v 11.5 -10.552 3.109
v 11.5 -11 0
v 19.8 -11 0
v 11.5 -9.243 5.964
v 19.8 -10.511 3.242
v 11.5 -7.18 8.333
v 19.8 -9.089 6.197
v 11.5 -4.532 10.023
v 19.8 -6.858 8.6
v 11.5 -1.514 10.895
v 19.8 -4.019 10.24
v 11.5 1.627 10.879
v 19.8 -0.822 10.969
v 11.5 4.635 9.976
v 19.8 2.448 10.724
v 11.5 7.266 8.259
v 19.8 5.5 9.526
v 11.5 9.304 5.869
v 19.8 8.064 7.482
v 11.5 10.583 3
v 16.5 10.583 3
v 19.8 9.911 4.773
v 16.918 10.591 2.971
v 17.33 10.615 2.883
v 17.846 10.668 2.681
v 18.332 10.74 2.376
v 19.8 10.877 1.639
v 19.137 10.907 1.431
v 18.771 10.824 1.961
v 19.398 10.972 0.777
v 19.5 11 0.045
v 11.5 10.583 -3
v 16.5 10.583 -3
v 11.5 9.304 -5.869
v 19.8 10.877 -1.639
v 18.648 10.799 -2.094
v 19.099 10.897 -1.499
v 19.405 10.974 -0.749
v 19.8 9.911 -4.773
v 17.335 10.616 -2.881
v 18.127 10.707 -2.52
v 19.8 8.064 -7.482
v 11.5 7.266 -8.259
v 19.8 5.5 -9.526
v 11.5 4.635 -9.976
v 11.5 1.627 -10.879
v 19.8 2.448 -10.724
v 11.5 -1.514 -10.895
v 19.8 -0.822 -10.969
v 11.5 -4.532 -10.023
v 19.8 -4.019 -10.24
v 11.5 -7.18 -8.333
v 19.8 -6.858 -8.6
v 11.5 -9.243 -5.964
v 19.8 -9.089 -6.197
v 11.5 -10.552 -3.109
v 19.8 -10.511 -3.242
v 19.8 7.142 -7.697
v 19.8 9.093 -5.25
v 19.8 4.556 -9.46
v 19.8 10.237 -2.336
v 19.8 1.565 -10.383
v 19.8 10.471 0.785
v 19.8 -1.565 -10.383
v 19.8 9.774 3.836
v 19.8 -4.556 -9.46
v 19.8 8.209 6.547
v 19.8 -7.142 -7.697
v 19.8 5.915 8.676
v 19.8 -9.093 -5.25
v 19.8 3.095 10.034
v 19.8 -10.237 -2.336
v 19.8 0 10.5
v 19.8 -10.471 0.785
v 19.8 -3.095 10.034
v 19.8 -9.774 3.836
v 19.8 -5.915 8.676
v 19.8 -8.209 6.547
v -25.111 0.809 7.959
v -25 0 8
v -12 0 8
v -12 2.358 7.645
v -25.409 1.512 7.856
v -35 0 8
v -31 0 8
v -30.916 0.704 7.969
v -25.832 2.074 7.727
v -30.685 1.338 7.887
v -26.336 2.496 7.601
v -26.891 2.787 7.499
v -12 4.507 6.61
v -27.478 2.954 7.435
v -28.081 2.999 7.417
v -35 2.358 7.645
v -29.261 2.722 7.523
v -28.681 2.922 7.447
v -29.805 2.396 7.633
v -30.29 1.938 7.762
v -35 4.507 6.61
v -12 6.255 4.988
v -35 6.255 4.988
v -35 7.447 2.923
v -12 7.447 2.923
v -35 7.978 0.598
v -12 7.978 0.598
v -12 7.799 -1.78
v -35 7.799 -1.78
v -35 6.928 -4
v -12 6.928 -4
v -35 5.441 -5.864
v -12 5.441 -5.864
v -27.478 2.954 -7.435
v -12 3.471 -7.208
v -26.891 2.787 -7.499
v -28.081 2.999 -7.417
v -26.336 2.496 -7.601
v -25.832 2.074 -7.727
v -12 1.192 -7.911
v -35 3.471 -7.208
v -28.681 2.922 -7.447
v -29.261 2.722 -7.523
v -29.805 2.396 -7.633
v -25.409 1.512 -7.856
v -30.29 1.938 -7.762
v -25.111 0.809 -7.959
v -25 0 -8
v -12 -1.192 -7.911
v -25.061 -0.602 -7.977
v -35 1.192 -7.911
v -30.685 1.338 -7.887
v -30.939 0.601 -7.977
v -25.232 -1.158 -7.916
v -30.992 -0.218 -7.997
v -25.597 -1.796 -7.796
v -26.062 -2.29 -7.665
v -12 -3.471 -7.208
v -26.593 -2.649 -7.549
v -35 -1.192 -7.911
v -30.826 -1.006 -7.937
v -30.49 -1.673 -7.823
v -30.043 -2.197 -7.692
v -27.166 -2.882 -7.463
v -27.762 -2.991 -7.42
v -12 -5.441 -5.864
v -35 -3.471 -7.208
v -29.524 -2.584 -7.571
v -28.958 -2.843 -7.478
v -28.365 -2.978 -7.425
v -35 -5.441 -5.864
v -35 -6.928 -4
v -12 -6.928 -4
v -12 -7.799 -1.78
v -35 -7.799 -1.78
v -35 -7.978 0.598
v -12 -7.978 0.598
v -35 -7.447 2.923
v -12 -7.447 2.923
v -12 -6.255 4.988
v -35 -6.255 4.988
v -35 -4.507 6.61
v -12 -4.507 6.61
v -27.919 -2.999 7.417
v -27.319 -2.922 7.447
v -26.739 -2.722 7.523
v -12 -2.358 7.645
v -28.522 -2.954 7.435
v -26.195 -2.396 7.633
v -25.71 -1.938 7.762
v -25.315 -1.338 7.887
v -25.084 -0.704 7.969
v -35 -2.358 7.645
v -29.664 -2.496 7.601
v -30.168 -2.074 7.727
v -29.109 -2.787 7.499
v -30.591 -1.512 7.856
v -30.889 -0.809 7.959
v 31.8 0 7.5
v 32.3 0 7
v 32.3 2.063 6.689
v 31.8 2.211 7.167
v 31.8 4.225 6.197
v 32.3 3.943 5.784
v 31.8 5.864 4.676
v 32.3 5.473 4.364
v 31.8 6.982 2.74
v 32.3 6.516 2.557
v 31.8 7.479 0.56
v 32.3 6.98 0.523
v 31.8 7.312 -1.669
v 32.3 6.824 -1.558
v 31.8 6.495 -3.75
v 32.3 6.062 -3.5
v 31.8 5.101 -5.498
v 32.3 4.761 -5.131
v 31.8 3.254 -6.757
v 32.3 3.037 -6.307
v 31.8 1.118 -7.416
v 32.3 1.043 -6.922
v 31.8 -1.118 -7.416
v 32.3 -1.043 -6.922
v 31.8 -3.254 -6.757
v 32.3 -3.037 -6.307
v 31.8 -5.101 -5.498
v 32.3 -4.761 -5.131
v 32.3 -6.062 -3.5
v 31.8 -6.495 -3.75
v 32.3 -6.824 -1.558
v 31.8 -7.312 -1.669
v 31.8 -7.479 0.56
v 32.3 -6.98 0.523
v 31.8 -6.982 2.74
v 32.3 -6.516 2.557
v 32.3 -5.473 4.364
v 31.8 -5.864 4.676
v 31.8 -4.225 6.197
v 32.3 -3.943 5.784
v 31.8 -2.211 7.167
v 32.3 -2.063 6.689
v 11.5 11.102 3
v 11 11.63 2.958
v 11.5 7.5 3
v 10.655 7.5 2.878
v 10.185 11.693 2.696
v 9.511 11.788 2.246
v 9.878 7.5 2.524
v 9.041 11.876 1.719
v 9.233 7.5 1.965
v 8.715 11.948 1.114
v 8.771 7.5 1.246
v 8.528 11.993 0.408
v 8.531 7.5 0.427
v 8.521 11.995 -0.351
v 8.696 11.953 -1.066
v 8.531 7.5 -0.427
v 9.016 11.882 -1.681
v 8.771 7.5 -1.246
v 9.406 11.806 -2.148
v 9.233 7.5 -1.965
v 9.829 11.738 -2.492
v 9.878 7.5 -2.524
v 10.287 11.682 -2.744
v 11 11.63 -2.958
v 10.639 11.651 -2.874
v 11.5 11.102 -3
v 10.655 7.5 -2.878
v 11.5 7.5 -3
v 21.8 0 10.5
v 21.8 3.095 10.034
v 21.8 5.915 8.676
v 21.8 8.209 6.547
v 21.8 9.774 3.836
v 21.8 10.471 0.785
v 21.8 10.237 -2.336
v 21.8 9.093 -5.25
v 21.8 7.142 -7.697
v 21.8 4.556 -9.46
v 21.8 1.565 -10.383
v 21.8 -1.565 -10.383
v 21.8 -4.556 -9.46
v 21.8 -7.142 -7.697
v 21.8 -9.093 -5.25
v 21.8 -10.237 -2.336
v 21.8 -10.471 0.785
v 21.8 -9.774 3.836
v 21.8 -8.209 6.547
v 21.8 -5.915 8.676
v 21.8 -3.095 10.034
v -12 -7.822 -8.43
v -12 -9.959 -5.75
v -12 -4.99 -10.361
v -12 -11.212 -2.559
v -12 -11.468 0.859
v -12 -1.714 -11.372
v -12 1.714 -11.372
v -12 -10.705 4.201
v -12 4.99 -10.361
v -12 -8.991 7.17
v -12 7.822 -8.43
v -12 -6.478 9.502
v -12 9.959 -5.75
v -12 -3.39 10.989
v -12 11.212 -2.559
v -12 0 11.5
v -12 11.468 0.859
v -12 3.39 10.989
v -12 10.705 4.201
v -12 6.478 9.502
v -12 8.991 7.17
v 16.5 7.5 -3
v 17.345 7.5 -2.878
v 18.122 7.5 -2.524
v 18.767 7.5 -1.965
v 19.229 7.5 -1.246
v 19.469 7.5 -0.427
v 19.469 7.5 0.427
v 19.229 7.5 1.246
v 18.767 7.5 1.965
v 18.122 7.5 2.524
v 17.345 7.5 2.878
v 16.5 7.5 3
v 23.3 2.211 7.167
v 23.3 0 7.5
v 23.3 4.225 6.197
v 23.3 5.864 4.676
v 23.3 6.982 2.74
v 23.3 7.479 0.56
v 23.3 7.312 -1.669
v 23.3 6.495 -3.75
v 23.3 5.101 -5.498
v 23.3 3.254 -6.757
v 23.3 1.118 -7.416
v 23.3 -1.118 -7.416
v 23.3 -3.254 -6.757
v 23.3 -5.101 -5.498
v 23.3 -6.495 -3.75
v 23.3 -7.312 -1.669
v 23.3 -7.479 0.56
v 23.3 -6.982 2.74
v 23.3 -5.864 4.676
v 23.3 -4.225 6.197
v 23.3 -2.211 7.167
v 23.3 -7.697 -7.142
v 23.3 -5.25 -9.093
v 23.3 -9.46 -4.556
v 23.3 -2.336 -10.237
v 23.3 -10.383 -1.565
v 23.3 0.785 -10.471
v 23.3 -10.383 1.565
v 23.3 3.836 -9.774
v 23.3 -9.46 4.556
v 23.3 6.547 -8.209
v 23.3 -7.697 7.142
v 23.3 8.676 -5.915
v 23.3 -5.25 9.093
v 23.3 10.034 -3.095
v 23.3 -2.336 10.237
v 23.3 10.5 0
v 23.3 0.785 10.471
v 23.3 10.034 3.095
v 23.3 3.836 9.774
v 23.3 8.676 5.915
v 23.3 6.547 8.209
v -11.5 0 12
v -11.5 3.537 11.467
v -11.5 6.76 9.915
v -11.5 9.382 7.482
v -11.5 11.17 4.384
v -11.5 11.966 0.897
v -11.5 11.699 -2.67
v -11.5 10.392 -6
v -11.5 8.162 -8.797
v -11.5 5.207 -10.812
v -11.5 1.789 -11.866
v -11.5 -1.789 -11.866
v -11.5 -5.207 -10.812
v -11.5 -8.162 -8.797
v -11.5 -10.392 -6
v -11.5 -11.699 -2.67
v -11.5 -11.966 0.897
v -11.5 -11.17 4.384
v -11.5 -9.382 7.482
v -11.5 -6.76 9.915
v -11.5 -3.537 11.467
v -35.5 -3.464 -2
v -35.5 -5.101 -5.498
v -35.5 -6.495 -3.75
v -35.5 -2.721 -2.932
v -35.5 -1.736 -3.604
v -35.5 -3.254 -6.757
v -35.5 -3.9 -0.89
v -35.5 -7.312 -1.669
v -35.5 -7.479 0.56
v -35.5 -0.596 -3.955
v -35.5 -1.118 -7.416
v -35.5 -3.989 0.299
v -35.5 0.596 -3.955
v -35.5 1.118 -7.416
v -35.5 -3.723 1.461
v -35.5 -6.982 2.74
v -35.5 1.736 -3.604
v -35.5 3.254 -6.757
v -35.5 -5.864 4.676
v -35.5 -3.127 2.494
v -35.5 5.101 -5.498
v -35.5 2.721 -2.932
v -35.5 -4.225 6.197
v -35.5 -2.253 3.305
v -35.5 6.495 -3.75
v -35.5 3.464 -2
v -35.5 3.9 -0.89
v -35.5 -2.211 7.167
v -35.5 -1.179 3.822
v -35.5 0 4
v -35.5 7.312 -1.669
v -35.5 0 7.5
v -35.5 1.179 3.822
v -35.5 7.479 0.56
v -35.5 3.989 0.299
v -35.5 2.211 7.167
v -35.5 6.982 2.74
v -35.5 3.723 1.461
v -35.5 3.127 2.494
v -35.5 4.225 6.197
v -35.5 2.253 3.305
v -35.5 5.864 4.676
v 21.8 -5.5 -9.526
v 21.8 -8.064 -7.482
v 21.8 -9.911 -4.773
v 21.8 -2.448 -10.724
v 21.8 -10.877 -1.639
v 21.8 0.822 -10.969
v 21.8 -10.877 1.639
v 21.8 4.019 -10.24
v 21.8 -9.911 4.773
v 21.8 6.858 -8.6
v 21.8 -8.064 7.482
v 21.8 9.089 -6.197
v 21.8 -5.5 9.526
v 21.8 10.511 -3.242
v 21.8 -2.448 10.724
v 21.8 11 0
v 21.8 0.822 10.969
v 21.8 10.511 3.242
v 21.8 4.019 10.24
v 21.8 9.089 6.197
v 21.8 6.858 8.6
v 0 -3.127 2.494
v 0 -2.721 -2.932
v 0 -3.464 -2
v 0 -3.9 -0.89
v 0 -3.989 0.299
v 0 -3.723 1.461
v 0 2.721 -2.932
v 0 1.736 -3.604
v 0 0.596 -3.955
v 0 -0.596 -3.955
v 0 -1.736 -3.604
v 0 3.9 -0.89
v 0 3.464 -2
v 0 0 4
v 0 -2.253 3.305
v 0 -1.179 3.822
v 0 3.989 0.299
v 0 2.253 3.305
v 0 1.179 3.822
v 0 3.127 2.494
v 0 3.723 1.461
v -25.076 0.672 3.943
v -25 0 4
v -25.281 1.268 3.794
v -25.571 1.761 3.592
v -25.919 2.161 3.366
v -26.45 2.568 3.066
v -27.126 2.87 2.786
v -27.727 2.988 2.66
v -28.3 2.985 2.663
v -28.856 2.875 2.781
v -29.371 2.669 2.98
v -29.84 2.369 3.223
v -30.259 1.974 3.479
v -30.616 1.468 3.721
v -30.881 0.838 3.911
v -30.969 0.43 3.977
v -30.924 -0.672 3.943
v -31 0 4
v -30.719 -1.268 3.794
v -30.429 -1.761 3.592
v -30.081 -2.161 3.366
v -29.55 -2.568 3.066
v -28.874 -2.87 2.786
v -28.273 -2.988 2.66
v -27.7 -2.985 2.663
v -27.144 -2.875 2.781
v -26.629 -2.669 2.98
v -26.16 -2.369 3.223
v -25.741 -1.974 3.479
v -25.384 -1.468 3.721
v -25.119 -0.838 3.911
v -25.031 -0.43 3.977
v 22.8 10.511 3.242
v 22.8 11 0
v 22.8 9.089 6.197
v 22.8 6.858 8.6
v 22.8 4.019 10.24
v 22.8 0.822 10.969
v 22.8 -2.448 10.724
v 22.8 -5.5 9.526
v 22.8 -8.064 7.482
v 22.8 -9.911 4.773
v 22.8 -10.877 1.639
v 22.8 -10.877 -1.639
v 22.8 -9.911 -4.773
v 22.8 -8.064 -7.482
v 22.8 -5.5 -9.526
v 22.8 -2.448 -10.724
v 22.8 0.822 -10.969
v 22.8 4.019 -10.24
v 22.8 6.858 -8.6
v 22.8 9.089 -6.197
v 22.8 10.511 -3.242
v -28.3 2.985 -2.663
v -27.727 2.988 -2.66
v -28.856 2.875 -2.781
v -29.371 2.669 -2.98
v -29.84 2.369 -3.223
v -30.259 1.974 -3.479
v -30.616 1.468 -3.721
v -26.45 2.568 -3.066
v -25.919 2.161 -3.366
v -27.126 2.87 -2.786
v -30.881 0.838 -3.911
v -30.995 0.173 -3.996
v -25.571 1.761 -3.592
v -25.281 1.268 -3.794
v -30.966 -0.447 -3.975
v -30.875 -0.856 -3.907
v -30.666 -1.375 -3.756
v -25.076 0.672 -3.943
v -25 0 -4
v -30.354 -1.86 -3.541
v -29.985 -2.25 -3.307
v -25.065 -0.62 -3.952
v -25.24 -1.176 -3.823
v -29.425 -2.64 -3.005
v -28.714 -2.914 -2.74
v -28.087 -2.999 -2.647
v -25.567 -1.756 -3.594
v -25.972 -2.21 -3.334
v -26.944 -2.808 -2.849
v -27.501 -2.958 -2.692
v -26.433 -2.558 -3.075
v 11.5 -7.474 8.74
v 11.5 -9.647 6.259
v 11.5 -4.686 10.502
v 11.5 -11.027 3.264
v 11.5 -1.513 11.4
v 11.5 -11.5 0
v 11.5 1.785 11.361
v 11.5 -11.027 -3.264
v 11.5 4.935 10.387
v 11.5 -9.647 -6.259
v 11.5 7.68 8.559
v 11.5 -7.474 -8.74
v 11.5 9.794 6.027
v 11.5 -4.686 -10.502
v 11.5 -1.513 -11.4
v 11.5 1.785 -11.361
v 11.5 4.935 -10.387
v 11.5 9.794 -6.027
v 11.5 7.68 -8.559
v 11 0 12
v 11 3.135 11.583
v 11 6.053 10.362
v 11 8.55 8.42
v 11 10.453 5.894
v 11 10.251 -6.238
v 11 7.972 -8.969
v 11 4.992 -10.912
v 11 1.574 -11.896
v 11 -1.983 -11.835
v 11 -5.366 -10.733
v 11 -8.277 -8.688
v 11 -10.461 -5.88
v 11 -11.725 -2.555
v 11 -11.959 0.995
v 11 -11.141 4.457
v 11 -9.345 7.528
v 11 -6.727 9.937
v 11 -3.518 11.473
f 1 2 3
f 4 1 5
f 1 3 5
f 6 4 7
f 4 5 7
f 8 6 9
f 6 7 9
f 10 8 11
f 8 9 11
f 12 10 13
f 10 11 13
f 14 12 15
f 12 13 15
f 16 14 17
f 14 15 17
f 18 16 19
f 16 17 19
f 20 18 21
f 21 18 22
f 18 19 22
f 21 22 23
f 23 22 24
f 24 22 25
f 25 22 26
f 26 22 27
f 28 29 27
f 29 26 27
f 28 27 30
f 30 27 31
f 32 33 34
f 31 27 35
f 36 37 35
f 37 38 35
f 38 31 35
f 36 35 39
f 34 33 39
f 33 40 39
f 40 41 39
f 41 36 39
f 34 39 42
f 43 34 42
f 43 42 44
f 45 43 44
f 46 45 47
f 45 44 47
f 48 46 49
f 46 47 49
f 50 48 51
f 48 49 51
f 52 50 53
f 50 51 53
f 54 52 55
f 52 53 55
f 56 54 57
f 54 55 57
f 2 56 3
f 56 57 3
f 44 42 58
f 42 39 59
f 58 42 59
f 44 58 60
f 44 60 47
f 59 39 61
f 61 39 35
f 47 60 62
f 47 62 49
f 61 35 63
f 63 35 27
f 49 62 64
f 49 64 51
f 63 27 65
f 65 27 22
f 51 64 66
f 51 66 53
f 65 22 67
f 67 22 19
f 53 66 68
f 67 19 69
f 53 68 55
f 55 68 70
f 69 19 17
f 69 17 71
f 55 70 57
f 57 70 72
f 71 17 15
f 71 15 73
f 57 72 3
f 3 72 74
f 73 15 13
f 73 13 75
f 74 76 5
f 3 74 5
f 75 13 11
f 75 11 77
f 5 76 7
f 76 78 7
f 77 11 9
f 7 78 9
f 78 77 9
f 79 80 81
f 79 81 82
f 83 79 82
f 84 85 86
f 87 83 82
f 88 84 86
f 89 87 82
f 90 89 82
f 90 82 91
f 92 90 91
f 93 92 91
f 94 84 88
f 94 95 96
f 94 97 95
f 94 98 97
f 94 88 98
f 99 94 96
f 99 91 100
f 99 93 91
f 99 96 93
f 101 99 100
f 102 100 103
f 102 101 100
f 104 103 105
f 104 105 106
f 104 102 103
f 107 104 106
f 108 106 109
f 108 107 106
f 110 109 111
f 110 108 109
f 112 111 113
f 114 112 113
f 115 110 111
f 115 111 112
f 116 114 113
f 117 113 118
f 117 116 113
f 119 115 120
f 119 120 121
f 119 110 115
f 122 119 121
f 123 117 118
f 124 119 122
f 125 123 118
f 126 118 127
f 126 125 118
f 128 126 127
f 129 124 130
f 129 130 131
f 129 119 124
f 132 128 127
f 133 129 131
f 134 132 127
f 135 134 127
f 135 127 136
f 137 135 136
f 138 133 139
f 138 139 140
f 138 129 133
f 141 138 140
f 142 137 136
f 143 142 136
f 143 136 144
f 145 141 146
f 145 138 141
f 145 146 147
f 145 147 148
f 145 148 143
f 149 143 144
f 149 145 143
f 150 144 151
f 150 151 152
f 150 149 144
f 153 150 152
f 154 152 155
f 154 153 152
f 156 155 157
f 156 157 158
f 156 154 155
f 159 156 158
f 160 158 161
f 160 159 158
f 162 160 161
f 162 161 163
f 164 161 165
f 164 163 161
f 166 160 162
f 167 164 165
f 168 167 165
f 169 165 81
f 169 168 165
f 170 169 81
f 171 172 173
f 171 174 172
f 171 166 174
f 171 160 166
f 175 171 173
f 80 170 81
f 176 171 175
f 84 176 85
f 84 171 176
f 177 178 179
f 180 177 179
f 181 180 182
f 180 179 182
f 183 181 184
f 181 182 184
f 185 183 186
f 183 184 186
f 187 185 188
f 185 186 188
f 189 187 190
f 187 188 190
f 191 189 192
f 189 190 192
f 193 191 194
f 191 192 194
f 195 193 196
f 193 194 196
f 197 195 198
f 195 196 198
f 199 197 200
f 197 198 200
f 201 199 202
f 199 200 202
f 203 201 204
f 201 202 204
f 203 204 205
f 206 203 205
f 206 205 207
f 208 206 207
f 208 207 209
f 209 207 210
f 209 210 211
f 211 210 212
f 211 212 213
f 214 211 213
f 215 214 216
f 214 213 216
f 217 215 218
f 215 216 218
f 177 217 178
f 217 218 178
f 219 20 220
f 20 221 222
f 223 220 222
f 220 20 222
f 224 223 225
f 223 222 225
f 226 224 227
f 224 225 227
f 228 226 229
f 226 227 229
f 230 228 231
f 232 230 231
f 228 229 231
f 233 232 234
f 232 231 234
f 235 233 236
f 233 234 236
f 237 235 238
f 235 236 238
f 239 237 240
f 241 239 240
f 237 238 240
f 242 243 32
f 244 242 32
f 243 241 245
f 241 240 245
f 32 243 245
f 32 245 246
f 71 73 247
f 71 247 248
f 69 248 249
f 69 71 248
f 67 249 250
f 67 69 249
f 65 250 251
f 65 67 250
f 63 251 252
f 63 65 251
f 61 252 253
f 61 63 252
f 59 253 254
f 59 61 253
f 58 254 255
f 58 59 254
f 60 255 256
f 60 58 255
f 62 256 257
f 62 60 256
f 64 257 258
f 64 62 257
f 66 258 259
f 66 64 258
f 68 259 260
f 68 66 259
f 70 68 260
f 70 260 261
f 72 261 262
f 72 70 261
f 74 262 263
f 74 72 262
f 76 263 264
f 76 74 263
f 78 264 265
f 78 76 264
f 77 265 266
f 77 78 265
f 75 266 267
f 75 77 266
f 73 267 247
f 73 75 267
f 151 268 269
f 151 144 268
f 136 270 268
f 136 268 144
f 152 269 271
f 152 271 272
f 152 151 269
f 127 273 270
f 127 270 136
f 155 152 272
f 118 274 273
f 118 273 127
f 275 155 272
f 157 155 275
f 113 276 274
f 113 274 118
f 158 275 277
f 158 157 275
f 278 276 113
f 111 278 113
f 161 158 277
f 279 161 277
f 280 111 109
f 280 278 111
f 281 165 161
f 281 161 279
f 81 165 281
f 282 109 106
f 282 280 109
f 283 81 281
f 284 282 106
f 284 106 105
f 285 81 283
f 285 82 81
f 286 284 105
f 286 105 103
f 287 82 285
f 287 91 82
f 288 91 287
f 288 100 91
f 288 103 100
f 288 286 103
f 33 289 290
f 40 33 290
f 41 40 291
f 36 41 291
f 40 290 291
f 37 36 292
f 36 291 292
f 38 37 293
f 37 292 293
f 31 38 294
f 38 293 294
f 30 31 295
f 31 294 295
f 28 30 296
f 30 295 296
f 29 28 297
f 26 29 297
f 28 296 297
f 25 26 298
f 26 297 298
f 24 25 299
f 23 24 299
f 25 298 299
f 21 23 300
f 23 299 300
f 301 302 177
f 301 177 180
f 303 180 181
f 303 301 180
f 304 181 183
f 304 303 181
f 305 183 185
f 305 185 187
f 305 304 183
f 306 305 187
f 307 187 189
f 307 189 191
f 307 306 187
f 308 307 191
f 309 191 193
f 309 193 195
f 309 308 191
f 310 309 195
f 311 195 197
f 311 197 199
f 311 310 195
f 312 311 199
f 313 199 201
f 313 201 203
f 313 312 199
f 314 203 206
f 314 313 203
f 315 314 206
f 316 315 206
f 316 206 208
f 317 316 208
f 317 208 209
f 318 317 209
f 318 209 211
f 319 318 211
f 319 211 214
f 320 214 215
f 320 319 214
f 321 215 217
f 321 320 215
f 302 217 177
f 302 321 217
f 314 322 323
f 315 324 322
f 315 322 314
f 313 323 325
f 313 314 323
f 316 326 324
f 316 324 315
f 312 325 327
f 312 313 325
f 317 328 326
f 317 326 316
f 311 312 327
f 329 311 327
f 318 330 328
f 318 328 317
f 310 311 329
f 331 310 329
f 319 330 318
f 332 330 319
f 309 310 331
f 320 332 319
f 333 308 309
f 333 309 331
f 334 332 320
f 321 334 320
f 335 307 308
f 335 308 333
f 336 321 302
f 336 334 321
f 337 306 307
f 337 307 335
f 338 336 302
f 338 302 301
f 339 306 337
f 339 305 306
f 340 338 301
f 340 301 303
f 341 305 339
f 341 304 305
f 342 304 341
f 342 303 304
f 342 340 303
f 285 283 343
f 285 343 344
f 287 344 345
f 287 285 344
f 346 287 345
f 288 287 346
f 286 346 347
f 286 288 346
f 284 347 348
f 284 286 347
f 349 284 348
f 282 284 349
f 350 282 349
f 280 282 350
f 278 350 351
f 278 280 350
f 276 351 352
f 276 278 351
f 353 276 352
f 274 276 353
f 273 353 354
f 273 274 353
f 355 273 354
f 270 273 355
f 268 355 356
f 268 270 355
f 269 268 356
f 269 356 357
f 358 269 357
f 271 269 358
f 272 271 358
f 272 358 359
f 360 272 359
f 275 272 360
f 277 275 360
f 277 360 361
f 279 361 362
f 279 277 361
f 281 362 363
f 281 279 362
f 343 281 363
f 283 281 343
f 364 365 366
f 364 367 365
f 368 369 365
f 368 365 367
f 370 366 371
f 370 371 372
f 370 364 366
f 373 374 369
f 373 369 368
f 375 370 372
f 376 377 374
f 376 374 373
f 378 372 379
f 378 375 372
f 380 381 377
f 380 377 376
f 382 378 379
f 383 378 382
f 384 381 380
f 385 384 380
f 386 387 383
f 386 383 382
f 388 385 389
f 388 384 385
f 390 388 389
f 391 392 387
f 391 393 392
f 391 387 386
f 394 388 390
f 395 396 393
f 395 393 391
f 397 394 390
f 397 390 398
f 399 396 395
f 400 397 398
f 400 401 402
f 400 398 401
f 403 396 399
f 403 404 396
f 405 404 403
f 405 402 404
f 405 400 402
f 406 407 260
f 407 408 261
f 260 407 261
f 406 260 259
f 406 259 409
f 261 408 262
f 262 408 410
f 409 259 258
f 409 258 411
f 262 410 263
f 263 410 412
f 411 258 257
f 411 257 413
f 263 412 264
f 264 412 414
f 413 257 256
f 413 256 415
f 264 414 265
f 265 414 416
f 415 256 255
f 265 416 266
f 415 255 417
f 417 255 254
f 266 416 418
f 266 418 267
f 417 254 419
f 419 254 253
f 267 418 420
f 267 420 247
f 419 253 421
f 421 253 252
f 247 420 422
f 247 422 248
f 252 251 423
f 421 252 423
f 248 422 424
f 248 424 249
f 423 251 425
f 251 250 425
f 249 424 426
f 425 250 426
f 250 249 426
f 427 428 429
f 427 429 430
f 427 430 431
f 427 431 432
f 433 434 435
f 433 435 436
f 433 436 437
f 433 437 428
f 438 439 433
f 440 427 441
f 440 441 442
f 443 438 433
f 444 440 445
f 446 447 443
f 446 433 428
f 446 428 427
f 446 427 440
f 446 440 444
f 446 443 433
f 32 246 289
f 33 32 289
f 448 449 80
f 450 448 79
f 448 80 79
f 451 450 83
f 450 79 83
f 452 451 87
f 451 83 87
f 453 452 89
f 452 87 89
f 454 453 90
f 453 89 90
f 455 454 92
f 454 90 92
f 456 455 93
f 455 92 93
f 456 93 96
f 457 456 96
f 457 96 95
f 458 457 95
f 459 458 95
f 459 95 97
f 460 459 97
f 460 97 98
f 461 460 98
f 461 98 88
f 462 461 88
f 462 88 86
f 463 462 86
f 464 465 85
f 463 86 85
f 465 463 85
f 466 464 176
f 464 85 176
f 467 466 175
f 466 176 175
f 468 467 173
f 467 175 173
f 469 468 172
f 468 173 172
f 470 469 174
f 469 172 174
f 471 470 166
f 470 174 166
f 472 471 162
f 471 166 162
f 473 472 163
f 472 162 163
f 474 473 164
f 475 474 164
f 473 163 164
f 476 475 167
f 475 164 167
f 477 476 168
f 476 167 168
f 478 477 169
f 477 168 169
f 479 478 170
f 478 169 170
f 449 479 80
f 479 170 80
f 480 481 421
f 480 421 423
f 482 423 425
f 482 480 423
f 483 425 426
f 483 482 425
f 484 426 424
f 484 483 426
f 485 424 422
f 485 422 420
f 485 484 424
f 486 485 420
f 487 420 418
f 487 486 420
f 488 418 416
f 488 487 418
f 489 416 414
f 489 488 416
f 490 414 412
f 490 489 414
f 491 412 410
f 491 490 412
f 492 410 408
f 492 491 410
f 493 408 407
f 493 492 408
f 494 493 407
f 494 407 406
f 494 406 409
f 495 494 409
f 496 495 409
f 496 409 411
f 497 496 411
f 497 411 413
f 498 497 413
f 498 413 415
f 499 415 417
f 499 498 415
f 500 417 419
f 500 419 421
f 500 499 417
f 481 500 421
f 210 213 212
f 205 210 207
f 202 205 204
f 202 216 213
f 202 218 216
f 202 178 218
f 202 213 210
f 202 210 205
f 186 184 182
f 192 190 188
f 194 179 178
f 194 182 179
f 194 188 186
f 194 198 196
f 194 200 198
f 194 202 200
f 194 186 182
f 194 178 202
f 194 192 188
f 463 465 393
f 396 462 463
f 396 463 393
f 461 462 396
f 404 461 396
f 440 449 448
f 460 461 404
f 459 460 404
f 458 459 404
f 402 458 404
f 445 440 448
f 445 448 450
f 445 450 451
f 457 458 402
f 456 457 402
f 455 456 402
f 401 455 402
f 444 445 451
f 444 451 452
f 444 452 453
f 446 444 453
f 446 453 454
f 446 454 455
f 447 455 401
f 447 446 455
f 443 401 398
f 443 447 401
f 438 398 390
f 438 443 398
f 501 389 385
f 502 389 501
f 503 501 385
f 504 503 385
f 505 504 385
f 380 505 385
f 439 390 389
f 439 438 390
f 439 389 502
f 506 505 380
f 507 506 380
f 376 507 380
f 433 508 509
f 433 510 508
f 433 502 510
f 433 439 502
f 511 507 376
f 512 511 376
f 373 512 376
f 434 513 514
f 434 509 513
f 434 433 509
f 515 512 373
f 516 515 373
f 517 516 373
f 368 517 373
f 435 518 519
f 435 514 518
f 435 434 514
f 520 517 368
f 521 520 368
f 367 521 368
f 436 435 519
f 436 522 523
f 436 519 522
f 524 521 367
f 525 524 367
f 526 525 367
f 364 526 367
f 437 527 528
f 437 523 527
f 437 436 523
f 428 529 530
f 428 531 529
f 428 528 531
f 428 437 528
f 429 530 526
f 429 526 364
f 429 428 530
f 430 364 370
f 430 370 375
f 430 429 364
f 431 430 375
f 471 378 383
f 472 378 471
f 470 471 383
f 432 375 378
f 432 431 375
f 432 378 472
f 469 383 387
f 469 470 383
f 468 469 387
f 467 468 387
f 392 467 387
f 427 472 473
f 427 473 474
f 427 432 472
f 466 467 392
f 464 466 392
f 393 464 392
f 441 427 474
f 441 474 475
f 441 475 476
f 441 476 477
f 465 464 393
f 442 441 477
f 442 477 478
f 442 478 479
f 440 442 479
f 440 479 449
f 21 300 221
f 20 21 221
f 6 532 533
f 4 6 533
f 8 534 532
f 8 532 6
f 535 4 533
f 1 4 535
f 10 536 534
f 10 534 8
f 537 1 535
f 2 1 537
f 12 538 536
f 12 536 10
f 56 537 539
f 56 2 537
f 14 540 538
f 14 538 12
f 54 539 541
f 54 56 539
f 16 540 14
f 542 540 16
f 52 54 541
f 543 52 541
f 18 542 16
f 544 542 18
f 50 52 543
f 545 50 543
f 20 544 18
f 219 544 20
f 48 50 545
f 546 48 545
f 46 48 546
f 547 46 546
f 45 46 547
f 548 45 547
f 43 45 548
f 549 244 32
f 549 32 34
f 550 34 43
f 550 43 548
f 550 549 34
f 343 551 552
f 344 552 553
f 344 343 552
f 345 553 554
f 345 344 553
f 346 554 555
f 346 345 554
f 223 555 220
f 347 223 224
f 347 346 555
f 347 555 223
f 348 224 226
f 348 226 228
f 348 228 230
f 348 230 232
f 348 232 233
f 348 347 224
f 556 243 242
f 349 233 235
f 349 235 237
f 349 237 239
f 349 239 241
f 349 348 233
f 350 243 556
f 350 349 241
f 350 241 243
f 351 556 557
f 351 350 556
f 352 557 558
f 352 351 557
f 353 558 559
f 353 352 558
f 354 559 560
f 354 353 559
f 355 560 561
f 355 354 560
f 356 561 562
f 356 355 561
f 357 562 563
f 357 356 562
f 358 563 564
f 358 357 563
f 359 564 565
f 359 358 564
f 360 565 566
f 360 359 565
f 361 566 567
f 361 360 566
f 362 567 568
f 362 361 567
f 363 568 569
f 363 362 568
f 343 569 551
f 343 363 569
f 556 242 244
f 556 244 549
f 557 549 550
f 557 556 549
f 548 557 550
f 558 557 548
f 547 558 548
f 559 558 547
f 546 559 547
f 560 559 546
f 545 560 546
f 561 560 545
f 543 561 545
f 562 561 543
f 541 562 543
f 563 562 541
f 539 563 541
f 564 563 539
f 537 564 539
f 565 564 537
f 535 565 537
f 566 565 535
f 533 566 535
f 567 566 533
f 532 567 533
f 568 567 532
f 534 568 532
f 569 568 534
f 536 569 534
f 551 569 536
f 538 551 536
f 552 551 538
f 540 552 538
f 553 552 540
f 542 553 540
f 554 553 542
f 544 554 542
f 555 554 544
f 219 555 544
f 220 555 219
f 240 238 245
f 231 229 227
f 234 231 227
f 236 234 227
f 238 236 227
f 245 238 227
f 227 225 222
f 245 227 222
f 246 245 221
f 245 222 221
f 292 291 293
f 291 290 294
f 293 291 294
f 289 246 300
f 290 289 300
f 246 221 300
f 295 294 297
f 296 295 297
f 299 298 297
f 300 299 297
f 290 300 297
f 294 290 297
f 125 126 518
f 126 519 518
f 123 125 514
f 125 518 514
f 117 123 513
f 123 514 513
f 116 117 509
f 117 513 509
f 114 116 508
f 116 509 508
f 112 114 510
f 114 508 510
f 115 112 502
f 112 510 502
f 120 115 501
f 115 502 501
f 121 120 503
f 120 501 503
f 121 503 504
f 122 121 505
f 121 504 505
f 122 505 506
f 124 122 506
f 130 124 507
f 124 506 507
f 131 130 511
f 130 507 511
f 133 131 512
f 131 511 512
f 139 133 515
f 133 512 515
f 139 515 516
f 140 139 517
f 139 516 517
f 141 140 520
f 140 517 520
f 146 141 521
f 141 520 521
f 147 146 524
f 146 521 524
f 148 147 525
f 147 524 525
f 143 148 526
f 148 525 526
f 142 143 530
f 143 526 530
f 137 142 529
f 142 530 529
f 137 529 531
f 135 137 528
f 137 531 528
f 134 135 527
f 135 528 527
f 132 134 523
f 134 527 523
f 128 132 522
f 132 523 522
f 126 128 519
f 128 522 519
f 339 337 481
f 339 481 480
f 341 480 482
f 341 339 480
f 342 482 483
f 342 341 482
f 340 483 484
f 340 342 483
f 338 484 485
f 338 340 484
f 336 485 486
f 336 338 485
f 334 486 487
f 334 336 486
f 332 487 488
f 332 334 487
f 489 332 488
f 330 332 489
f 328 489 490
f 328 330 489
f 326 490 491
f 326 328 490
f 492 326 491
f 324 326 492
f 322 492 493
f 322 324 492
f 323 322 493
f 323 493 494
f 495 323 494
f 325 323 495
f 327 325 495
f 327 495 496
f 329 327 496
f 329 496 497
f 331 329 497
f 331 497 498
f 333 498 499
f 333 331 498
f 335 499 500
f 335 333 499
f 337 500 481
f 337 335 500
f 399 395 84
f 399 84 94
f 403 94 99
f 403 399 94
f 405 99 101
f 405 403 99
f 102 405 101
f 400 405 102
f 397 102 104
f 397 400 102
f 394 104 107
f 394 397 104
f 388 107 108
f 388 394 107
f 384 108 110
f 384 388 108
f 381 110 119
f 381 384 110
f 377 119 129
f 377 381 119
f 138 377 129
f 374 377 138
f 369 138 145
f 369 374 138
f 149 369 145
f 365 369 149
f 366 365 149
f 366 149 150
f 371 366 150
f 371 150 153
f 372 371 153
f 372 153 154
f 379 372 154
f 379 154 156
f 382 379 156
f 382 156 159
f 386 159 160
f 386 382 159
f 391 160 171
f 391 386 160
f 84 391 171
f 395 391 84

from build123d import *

# Parameters (mm, degrees)
F2_SIZE   = 0.5
F3_R      = 11
F3_R_2    = 10.5
F4_DEPTH  = 1.5
F6_R      = 11
F6_R_2    = 10.5
F7_DEPTH  = 8.3
F8_SIZE   = 0.5
F11_DEPTH = 25
F12_R     = 3
F13_DEPTH = 12.5


with BuildPart() as f1:
    # F0 (on Front) → F1 (revolve)
    with BuildSketch(Plane.XZ):
        Polygon((0, 4), (0, 0), (32.3, 0), (32.3, 7.5), (23.3, 7.5), (23.3, 10.5), (11.5, 10.5), (11.5, 12), (-12, 12), (-12, 8), (-35.5, 8), (-35.5, 4), align=None)
    revolve(axis=Axis((16.15, 0, 0), (-1, 0, 0)))

    # F2
    f2_edges = [f1.edges().sort_by_distance(p)[0] for p in [
        (-12, 0, -12),
    ]]
    chamfer(f2_edges, length=F2_SIZE)

    # F3 (on face) → F4 (join)
    with BuildSketch(Plane.YZ.offset(23.3)):
        Circle(F3_R)
        Circle(F3_R_2, mode=Mode.SUBTRACT)
    extrude(amount=-F4_DEPTH)

    # F6 (on offset) → F7 (join, through all)
    with BuildSketch(Plane(origin=(19.8, 0, 0), x_dir=(0, -1, 0), z_dir=(-1, 0, 0))):
        Circle(F6_R)
        Circle(F6_R_2, mode=Mode.SUBTRACT)
    extrude(amount=F7_DEPTH)

    # F8
    f8_edges = [f1.edges().sort_by_distance(p)[0] for p in [
        (32.3, 0, -7.5),
        (23.3, -11, 0),
        (11.5, 0, -12),
        (-35.5, 0, -8),
    ]]
    chamfer(f8_edges, length=F8_SIZE)

    # F10 (on offset) → F11 (cut)
    with BuildSketch(Plane.XZ.offset(-7.5)):
        with BuildLine():
            Line((11.5, -3), (16.5, -3))
            ThreePointArc((16.5, -3), (19.5, 0), (16.5, 3))
            Line((16.5, 3), (11.5, 3))
            ThreePointArc((11.5, 3), (8.5, 0), (11.5, -3))
        make_face()
    extrude(amount=-F11_DEPTH, mode=Mode.SUBTRACT)

    # F12 (on Top) → F13 (cut, symmetric)
    with BuildSketch(Plane.XY):
        with Locations((-28, 0)):
            Circle(F12_R)
    extrude(amount=F13_DEPTH, both=True, mode=Mode.SUBTRACT)


solid = f1.part
